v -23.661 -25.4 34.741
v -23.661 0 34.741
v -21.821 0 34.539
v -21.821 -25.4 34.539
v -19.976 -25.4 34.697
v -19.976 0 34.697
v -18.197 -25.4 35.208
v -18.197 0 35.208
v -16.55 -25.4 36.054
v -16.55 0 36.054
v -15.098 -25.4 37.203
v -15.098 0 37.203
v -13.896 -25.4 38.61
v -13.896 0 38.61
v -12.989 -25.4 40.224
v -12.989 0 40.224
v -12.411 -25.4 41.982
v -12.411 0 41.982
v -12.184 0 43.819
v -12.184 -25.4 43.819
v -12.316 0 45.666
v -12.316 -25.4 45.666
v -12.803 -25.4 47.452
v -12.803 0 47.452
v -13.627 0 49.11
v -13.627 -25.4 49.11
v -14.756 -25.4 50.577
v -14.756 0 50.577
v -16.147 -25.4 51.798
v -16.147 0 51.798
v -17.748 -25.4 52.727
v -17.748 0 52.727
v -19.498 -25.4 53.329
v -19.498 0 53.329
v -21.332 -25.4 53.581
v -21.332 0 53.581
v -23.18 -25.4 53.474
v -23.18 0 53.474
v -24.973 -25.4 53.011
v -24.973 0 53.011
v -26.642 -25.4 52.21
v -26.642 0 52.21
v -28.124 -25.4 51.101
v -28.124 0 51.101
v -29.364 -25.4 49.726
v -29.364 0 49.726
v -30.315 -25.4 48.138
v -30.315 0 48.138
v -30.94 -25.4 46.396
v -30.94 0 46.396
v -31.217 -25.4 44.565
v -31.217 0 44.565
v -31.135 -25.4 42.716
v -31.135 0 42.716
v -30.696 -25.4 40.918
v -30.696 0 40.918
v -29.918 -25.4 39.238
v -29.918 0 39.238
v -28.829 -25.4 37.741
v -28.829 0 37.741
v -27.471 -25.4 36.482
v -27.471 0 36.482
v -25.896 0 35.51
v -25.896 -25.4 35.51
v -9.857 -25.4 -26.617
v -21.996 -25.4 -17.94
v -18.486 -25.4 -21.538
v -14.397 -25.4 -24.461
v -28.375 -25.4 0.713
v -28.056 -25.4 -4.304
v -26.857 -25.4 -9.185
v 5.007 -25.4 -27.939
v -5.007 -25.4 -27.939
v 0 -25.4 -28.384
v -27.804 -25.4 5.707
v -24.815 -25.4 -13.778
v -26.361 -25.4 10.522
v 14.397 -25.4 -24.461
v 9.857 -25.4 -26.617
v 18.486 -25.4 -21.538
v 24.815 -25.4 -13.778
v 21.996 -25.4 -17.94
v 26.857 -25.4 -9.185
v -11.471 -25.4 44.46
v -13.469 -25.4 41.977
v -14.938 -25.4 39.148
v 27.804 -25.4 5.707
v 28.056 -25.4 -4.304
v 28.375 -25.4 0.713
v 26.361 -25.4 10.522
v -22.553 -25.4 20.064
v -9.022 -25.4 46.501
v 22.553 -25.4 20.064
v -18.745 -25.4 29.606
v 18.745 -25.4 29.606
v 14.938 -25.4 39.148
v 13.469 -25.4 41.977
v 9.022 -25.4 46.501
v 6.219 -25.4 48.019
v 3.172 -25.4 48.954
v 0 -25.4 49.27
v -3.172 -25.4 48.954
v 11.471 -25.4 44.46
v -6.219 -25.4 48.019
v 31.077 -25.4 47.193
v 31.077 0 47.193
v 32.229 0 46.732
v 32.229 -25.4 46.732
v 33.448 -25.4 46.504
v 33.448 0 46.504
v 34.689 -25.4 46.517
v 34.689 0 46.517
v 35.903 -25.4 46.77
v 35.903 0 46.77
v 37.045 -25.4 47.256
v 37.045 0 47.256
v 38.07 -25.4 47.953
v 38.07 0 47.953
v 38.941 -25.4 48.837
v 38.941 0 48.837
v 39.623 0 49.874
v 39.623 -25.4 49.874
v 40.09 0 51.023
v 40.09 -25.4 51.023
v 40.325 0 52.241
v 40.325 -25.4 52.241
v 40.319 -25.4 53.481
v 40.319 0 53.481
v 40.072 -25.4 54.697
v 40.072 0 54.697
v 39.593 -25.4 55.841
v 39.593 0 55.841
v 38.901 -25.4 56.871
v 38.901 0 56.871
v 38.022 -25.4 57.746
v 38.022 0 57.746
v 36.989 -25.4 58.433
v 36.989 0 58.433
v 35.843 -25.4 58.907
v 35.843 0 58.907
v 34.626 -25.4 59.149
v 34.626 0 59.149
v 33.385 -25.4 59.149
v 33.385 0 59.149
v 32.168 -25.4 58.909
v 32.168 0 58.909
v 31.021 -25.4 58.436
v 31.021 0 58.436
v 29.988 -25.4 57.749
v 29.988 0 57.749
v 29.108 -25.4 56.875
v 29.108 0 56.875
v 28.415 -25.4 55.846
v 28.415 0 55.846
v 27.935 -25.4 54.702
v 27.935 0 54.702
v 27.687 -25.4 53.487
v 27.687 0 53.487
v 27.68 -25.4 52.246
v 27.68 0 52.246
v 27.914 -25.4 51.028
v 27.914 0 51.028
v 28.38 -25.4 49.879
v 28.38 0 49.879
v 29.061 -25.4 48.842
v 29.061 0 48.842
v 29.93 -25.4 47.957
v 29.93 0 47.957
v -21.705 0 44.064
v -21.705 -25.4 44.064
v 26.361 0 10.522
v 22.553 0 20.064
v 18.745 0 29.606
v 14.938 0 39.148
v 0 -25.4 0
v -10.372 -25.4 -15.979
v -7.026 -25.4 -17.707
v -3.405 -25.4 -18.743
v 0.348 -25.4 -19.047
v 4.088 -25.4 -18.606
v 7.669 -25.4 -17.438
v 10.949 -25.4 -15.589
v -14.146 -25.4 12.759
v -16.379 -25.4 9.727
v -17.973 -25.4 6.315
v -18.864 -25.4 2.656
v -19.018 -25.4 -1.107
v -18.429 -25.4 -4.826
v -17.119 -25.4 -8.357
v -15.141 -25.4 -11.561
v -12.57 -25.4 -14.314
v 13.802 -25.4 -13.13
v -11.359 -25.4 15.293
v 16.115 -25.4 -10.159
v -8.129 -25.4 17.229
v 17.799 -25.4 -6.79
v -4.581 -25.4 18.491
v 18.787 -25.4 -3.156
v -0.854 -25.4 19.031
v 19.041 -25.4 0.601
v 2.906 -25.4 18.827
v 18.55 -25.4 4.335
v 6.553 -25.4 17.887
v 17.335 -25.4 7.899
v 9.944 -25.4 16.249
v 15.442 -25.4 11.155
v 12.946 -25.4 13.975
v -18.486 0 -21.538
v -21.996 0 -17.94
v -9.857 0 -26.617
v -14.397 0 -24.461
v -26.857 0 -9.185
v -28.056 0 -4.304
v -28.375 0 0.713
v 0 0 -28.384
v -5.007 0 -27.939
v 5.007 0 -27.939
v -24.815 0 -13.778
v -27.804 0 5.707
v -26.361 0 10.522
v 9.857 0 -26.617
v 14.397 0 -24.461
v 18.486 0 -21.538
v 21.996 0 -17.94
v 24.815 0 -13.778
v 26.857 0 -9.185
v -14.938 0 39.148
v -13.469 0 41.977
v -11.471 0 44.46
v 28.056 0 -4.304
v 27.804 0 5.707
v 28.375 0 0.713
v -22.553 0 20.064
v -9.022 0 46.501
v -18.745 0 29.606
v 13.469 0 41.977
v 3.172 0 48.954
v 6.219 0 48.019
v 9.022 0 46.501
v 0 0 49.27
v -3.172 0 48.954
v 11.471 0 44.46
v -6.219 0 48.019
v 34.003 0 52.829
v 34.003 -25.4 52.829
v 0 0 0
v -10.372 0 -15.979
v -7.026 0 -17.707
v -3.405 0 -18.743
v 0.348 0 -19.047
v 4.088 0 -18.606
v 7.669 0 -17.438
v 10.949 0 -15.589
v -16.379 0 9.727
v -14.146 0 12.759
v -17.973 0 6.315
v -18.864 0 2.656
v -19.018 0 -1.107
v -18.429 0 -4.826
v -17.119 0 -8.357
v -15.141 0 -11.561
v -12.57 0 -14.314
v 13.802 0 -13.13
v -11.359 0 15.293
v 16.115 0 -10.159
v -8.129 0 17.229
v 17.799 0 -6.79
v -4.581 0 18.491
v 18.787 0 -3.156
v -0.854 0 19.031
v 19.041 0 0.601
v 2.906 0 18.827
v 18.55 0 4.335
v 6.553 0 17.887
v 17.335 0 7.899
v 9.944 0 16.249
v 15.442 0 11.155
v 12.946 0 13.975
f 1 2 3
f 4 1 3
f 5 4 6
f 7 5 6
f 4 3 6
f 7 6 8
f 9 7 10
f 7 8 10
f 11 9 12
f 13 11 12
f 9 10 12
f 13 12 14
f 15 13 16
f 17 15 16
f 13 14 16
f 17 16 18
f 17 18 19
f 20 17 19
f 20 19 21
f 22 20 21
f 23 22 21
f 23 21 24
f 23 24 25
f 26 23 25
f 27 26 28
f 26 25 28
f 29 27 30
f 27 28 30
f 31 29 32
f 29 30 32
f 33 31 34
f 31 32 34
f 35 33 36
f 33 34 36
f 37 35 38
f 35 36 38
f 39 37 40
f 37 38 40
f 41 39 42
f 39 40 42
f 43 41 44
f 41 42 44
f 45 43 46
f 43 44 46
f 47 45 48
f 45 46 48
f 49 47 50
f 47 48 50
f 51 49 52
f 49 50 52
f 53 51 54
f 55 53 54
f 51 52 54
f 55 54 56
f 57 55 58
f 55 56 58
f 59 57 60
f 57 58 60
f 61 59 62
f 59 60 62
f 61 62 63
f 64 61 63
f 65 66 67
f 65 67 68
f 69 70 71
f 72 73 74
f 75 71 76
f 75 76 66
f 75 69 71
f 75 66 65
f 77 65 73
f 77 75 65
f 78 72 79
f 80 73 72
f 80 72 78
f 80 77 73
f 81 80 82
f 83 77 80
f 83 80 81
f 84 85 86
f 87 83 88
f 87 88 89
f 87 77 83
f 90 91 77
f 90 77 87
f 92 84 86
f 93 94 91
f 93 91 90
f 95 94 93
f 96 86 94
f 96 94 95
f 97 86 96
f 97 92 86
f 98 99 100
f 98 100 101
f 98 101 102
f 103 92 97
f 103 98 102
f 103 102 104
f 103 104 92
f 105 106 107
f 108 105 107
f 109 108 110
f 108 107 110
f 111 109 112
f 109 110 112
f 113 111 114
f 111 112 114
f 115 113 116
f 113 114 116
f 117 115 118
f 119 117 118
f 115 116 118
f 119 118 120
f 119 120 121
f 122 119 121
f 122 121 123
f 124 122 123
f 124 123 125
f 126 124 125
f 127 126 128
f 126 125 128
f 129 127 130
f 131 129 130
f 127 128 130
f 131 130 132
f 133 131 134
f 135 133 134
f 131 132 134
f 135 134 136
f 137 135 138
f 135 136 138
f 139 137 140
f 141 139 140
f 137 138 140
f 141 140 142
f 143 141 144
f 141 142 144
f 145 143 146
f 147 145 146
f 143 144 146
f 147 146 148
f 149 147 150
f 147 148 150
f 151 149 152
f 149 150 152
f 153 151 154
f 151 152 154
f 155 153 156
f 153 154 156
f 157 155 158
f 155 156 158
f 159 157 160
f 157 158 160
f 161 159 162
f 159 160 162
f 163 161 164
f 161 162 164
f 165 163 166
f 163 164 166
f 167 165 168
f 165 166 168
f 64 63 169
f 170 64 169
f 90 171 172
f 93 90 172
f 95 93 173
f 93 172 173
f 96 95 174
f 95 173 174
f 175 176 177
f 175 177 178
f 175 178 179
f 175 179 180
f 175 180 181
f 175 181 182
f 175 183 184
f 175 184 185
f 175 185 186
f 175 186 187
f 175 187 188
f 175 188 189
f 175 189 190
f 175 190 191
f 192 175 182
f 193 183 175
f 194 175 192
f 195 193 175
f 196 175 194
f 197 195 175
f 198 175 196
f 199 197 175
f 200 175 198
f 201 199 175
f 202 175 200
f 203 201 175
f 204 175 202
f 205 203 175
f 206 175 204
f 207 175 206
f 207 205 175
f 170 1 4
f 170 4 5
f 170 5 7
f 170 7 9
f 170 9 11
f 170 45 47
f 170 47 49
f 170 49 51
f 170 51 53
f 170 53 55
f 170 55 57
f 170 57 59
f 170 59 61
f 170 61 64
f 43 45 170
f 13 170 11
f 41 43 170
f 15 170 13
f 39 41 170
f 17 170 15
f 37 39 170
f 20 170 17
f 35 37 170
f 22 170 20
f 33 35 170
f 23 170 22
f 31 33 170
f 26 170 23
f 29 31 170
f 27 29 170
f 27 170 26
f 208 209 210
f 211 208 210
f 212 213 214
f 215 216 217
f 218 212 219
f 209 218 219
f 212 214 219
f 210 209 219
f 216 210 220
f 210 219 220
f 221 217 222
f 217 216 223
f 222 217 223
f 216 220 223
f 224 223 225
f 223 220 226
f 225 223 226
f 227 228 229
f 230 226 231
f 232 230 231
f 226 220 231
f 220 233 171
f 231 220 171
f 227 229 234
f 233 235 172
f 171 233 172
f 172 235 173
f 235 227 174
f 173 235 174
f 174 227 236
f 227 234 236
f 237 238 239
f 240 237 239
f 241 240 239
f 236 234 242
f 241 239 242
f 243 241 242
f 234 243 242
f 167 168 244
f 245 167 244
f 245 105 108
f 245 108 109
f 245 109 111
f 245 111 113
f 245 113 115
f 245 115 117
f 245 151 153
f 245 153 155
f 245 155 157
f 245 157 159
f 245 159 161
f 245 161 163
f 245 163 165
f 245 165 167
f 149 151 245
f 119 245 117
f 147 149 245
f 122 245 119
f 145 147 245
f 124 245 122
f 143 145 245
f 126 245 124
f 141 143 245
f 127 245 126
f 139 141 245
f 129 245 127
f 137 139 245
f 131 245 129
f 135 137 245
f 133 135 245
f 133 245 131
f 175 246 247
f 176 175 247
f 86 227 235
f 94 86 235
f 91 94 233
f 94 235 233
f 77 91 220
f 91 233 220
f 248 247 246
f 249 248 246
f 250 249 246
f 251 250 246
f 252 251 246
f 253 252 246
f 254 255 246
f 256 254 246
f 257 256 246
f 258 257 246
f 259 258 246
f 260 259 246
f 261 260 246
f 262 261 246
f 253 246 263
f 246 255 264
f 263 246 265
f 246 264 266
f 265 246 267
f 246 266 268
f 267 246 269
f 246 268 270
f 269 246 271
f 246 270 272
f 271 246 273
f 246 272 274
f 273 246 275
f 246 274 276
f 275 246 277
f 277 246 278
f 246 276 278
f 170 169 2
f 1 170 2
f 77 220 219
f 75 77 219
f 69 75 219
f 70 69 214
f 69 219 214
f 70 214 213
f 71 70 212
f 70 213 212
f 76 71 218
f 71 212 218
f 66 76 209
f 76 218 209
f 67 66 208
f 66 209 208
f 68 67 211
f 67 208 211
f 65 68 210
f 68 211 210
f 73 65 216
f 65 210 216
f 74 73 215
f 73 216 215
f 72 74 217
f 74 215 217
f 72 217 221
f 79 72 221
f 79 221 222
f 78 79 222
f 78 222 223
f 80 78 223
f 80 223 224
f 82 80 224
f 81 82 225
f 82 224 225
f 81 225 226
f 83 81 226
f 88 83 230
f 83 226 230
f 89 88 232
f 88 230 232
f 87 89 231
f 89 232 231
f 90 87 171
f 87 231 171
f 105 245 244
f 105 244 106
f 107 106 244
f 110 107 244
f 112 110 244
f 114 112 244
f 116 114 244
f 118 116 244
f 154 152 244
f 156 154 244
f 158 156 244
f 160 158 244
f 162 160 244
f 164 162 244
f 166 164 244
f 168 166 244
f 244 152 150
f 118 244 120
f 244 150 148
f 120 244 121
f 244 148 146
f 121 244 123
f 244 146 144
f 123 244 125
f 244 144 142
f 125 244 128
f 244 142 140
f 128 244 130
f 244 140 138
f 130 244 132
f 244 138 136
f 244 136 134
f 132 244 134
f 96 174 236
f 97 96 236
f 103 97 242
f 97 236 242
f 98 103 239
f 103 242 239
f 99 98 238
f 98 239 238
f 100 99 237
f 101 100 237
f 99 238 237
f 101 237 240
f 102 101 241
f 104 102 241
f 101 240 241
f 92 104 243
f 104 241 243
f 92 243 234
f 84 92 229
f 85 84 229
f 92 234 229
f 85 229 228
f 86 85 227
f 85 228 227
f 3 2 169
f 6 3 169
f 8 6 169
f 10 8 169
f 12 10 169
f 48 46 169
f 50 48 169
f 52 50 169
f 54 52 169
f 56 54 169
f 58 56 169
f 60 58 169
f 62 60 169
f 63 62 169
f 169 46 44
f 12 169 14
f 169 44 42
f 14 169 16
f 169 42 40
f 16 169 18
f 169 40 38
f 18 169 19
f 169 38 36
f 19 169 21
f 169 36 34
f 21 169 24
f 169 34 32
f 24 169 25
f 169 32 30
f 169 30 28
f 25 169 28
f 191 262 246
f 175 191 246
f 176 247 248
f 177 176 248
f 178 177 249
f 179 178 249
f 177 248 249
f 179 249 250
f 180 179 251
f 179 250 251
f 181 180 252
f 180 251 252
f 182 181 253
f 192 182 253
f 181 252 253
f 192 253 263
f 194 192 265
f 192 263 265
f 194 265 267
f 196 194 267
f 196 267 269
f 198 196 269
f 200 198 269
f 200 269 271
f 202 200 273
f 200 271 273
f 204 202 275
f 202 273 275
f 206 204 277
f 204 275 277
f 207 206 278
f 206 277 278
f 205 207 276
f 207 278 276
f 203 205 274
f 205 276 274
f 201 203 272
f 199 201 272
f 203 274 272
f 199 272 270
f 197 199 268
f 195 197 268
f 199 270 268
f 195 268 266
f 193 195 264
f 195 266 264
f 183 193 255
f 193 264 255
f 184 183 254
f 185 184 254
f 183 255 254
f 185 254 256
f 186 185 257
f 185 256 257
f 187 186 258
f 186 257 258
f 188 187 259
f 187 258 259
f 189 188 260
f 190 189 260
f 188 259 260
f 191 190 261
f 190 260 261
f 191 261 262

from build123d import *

# Parameters (mm, degrees)
F1_DEPTH = 25.4
F2_DEPTH = 25.4
F3_DEPTH = 25.4
F5_DEPTH = 25.4


with BuildPart() as f1:
    # F0 (on Front) → F1 (new body)
    with BuildSketch(Plane.XZ):
        with BuildLine():
            Line((0, 0), (-10.371908, -15.978924))
            ThreePointArc((-10.371908, -15.978924), (11.501359, 15.186219), (-12.570466, -14.313836))
            Line((-12.570466, -14.313836), (0, 0))
        make_face()
    extrude(amount=F1_DEPTH)


with BuildPart() as f2:
    # F0 (on Front) → F2 (new body)
    with BuildSketch(Plane.XZ):
        with BuildLine():
            Line((-21.705383, 44.063529), (-23.660642, 34.741373))
            ThreePointArc((-23.660642, 34.741373), (-18.608467, 53.071011), (-25.896083, 35.509954))
            Line((-25.896083, 35.509954), (-21.705383, 44.063529))
        make_face()
    extrude(amount=F2_DEPTH)


with BuildPart() as f3:
    # F0 (on Front) → F3 (new body)
    with BuildSketch(Plane.XZ):
        with BuildLine():
            Line((34.002694, 52.82942), (31.077413, 47.193355))
            ThreePointArc((31.077413, 47.193355), (37.522238, 58.114807), (29.930447, 47.957121))
            Line((29.930447, 47.957121), (34.002694, 52.82942))
        make_face()
    extrude(amount=F3_DEPTH)


with BuildPart() as f5:
    # F4 (on Front) → F5 (new body)
    with BuildSketch(Plane.XZ):
        with BuildLine():
            ThreePointArc((-14.937769, 39.147596), (-20.649164, 24.834584), (-26.361428, 10.521917))
            ThreePointArc((-26.361428, 10.521917), (0, -28.383721), (26.361428, 10.521917))
            ThreePointArc((26.361428, 10.521917), (20.649164, 24.834584), (14.937769, 39.147596))
            ThreePointArc((14.937769, 39.147596), (0, 49.270354), (-14.937769, 39.147596))
        make_face()
    extrude(amount=F5_DEPTH)


solid = Compound([f1.part, f2.part, f3.part, f5.part])
